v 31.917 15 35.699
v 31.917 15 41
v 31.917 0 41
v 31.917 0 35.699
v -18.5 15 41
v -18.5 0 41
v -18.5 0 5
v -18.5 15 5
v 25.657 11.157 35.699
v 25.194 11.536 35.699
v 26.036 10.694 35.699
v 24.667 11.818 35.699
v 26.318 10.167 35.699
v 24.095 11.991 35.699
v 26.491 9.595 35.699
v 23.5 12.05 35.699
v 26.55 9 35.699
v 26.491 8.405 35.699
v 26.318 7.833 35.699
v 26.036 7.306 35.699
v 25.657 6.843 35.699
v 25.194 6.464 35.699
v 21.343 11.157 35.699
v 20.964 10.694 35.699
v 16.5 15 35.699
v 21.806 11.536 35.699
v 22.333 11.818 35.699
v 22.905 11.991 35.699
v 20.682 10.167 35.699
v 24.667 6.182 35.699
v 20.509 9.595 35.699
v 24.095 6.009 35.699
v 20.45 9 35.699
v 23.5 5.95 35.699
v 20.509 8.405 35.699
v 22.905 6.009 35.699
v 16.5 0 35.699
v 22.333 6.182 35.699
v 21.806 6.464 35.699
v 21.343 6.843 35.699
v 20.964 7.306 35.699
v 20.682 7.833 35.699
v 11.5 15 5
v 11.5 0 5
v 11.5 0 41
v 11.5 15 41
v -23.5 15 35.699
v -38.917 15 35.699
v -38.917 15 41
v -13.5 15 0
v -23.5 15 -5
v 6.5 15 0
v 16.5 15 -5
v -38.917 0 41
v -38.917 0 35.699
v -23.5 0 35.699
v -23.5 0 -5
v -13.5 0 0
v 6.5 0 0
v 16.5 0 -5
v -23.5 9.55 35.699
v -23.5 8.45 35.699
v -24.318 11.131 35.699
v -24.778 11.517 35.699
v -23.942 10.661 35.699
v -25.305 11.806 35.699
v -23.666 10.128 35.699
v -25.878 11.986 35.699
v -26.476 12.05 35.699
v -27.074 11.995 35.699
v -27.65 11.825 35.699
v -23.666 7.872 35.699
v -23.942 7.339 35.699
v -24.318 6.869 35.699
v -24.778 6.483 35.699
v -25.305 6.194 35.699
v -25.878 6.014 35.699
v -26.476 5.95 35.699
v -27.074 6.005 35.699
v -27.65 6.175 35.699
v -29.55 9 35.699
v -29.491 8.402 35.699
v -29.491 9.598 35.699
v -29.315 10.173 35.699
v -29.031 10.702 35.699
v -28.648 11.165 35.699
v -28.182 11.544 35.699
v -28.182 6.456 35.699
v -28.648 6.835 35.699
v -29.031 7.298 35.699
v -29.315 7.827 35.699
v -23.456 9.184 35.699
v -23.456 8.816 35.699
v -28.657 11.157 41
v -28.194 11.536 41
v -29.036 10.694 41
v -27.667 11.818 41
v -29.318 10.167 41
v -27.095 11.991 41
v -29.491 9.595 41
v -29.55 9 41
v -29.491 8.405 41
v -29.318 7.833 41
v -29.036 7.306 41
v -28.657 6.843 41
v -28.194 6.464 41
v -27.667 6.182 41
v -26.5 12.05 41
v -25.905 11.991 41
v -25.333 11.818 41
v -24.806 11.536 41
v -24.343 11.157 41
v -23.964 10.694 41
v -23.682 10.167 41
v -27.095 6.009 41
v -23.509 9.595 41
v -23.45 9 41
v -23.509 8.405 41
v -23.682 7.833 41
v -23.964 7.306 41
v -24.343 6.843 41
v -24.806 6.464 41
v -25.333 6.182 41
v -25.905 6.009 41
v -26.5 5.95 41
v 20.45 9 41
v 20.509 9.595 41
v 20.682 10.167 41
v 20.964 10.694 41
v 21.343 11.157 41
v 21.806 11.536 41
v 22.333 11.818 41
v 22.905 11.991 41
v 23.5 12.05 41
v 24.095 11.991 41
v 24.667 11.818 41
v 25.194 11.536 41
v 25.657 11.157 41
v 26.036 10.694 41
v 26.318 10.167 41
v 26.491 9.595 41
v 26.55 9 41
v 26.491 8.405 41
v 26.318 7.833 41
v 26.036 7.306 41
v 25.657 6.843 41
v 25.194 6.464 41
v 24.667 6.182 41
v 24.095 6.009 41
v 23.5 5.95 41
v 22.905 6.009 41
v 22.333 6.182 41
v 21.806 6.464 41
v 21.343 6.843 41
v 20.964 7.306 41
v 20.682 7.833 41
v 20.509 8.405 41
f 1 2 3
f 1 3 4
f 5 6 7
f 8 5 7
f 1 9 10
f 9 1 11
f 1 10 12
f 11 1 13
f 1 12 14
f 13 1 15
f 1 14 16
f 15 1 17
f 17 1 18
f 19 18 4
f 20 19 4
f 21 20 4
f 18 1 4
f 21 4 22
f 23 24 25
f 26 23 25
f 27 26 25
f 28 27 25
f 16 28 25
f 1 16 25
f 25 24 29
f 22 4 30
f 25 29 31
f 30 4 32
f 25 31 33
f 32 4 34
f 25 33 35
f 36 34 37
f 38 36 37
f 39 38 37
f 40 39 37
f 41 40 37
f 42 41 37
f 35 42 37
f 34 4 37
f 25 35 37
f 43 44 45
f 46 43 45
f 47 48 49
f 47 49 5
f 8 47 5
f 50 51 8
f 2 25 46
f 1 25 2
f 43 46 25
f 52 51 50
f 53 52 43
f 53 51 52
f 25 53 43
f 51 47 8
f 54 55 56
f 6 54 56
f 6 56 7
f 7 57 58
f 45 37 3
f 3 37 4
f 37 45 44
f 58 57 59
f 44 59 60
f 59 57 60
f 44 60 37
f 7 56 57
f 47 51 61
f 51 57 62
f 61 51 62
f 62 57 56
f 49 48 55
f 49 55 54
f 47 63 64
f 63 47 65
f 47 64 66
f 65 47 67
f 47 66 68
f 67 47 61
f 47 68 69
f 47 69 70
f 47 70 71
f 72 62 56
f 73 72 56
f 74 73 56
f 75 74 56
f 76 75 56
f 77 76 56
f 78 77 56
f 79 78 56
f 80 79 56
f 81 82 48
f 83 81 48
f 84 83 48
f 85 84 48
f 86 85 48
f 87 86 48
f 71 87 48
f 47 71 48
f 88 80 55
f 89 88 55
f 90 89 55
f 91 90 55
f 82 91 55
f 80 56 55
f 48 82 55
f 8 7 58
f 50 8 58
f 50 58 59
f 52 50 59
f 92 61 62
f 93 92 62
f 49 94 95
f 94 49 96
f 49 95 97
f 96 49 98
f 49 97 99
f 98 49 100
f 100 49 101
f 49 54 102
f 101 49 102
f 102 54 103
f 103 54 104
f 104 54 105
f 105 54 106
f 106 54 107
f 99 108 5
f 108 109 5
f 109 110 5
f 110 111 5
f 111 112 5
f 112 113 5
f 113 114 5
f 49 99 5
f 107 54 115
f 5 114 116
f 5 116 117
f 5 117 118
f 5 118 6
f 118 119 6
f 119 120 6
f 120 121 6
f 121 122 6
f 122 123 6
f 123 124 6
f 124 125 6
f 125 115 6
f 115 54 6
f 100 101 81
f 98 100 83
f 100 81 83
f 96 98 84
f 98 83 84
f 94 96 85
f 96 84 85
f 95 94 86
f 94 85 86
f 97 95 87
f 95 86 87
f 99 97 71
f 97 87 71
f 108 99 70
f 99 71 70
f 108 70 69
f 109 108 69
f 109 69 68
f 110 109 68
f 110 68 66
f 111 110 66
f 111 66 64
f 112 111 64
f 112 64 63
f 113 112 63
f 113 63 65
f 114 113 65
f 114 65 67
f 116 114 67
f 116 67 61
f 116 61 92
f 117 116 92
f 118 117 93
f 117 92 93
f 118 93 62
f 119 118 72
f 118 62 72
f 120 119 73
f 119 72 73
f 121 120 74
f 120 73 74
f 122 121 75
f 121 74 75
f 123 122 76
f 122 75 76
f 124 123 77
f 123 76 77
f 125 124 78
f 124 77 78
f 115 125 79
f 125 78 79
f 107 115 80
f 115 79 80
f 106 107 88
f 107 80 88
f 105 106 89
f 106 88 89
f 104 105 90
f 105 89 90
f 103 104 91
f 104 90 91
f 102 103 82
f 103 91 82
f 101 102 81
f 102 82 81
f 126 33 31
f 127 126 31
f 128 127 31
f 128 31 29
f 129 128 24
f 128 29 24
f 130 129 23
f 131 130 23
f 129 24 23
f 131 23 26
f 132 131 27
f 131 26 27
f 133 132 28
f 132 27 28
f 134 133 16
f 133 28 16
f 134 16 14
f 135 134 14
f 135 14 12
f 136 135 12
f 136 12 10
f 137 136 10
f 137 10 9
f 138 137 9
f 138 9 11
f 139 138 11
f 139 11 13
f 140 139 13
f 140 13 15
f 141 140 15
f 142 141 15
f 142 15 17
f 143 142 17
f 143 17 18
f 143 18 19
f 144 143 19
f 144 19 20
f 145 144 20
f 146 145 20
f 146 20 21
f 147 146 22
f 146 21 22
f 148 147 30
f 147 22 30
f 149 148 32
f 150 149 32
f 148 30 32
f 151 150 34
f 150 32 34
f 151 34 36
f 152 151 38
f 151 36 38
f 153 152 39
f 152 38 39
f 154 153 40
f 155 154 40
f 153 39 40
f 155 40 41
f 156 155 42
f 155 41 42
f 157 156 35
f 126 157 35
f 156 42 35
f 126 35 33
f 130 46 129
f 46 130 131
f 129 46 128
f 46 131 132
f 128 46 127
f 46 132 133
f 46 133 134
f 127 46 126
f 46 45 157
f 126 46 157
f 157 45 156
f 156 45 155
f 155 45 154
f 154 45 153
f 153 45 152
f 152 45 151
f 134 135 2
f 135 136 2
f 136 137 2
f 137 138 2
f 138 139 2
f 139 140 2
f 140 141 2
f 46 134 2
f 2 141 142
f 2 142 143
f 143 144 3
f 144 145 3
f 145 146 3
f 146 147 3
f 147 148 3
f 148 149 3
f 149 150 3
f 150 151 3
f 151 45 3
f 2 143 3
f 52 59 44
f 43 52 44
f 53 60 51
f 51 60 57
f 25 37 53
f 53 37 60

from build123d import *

# Parameters (mm, degrees)
BOSS_EXTRUDE1_DEPTH = 15
SKETCH3_R           = 3.05
CUT_EXTRUDE1_DEPTH  = 15


with BuildPart() as part:
    # Sketch2 → Boss-Extrude1 (new body)
    with BuildSketch(Plane(origin=(0, 0, 0), x_dir=(1, 0, 0), z_dir=(0, 1, 0))):
        Polygon((-13.5, 0), (6.5, 0), (11.5, -5), (11.5, -41), (31.917309801, -41), (31.917309801, -35.69895288), (16.5, -35.69895288), (16.5, 5), (-23.5, 5), (-23.5, -35.69895288), (-38.917309801, -35.69895288), (-38.917309801, -41), (-18.5, -41), (-18.5, -5), align=None)
    extrude(amount=BOSS_EXTRUDE1_DEPTH)

    # Sketch3 → Cut-Extrude1 (cut)
    with BuildSketch(Plane(origin=(0, 0, 35.69895288), x_dir=(-1, 0, 0), z_dir=(0, 0, -1))):
        with Locations((26.5, 9)):
            Circle(SKETCH3_R)
        with Locations((-23.5, 9)):
            Circle(SKETCH3_R)
    extrude(amount=-CUT_EXTRUDE1_DEPTH, mode=Mode.SUBTRACT)


solid = part.part
